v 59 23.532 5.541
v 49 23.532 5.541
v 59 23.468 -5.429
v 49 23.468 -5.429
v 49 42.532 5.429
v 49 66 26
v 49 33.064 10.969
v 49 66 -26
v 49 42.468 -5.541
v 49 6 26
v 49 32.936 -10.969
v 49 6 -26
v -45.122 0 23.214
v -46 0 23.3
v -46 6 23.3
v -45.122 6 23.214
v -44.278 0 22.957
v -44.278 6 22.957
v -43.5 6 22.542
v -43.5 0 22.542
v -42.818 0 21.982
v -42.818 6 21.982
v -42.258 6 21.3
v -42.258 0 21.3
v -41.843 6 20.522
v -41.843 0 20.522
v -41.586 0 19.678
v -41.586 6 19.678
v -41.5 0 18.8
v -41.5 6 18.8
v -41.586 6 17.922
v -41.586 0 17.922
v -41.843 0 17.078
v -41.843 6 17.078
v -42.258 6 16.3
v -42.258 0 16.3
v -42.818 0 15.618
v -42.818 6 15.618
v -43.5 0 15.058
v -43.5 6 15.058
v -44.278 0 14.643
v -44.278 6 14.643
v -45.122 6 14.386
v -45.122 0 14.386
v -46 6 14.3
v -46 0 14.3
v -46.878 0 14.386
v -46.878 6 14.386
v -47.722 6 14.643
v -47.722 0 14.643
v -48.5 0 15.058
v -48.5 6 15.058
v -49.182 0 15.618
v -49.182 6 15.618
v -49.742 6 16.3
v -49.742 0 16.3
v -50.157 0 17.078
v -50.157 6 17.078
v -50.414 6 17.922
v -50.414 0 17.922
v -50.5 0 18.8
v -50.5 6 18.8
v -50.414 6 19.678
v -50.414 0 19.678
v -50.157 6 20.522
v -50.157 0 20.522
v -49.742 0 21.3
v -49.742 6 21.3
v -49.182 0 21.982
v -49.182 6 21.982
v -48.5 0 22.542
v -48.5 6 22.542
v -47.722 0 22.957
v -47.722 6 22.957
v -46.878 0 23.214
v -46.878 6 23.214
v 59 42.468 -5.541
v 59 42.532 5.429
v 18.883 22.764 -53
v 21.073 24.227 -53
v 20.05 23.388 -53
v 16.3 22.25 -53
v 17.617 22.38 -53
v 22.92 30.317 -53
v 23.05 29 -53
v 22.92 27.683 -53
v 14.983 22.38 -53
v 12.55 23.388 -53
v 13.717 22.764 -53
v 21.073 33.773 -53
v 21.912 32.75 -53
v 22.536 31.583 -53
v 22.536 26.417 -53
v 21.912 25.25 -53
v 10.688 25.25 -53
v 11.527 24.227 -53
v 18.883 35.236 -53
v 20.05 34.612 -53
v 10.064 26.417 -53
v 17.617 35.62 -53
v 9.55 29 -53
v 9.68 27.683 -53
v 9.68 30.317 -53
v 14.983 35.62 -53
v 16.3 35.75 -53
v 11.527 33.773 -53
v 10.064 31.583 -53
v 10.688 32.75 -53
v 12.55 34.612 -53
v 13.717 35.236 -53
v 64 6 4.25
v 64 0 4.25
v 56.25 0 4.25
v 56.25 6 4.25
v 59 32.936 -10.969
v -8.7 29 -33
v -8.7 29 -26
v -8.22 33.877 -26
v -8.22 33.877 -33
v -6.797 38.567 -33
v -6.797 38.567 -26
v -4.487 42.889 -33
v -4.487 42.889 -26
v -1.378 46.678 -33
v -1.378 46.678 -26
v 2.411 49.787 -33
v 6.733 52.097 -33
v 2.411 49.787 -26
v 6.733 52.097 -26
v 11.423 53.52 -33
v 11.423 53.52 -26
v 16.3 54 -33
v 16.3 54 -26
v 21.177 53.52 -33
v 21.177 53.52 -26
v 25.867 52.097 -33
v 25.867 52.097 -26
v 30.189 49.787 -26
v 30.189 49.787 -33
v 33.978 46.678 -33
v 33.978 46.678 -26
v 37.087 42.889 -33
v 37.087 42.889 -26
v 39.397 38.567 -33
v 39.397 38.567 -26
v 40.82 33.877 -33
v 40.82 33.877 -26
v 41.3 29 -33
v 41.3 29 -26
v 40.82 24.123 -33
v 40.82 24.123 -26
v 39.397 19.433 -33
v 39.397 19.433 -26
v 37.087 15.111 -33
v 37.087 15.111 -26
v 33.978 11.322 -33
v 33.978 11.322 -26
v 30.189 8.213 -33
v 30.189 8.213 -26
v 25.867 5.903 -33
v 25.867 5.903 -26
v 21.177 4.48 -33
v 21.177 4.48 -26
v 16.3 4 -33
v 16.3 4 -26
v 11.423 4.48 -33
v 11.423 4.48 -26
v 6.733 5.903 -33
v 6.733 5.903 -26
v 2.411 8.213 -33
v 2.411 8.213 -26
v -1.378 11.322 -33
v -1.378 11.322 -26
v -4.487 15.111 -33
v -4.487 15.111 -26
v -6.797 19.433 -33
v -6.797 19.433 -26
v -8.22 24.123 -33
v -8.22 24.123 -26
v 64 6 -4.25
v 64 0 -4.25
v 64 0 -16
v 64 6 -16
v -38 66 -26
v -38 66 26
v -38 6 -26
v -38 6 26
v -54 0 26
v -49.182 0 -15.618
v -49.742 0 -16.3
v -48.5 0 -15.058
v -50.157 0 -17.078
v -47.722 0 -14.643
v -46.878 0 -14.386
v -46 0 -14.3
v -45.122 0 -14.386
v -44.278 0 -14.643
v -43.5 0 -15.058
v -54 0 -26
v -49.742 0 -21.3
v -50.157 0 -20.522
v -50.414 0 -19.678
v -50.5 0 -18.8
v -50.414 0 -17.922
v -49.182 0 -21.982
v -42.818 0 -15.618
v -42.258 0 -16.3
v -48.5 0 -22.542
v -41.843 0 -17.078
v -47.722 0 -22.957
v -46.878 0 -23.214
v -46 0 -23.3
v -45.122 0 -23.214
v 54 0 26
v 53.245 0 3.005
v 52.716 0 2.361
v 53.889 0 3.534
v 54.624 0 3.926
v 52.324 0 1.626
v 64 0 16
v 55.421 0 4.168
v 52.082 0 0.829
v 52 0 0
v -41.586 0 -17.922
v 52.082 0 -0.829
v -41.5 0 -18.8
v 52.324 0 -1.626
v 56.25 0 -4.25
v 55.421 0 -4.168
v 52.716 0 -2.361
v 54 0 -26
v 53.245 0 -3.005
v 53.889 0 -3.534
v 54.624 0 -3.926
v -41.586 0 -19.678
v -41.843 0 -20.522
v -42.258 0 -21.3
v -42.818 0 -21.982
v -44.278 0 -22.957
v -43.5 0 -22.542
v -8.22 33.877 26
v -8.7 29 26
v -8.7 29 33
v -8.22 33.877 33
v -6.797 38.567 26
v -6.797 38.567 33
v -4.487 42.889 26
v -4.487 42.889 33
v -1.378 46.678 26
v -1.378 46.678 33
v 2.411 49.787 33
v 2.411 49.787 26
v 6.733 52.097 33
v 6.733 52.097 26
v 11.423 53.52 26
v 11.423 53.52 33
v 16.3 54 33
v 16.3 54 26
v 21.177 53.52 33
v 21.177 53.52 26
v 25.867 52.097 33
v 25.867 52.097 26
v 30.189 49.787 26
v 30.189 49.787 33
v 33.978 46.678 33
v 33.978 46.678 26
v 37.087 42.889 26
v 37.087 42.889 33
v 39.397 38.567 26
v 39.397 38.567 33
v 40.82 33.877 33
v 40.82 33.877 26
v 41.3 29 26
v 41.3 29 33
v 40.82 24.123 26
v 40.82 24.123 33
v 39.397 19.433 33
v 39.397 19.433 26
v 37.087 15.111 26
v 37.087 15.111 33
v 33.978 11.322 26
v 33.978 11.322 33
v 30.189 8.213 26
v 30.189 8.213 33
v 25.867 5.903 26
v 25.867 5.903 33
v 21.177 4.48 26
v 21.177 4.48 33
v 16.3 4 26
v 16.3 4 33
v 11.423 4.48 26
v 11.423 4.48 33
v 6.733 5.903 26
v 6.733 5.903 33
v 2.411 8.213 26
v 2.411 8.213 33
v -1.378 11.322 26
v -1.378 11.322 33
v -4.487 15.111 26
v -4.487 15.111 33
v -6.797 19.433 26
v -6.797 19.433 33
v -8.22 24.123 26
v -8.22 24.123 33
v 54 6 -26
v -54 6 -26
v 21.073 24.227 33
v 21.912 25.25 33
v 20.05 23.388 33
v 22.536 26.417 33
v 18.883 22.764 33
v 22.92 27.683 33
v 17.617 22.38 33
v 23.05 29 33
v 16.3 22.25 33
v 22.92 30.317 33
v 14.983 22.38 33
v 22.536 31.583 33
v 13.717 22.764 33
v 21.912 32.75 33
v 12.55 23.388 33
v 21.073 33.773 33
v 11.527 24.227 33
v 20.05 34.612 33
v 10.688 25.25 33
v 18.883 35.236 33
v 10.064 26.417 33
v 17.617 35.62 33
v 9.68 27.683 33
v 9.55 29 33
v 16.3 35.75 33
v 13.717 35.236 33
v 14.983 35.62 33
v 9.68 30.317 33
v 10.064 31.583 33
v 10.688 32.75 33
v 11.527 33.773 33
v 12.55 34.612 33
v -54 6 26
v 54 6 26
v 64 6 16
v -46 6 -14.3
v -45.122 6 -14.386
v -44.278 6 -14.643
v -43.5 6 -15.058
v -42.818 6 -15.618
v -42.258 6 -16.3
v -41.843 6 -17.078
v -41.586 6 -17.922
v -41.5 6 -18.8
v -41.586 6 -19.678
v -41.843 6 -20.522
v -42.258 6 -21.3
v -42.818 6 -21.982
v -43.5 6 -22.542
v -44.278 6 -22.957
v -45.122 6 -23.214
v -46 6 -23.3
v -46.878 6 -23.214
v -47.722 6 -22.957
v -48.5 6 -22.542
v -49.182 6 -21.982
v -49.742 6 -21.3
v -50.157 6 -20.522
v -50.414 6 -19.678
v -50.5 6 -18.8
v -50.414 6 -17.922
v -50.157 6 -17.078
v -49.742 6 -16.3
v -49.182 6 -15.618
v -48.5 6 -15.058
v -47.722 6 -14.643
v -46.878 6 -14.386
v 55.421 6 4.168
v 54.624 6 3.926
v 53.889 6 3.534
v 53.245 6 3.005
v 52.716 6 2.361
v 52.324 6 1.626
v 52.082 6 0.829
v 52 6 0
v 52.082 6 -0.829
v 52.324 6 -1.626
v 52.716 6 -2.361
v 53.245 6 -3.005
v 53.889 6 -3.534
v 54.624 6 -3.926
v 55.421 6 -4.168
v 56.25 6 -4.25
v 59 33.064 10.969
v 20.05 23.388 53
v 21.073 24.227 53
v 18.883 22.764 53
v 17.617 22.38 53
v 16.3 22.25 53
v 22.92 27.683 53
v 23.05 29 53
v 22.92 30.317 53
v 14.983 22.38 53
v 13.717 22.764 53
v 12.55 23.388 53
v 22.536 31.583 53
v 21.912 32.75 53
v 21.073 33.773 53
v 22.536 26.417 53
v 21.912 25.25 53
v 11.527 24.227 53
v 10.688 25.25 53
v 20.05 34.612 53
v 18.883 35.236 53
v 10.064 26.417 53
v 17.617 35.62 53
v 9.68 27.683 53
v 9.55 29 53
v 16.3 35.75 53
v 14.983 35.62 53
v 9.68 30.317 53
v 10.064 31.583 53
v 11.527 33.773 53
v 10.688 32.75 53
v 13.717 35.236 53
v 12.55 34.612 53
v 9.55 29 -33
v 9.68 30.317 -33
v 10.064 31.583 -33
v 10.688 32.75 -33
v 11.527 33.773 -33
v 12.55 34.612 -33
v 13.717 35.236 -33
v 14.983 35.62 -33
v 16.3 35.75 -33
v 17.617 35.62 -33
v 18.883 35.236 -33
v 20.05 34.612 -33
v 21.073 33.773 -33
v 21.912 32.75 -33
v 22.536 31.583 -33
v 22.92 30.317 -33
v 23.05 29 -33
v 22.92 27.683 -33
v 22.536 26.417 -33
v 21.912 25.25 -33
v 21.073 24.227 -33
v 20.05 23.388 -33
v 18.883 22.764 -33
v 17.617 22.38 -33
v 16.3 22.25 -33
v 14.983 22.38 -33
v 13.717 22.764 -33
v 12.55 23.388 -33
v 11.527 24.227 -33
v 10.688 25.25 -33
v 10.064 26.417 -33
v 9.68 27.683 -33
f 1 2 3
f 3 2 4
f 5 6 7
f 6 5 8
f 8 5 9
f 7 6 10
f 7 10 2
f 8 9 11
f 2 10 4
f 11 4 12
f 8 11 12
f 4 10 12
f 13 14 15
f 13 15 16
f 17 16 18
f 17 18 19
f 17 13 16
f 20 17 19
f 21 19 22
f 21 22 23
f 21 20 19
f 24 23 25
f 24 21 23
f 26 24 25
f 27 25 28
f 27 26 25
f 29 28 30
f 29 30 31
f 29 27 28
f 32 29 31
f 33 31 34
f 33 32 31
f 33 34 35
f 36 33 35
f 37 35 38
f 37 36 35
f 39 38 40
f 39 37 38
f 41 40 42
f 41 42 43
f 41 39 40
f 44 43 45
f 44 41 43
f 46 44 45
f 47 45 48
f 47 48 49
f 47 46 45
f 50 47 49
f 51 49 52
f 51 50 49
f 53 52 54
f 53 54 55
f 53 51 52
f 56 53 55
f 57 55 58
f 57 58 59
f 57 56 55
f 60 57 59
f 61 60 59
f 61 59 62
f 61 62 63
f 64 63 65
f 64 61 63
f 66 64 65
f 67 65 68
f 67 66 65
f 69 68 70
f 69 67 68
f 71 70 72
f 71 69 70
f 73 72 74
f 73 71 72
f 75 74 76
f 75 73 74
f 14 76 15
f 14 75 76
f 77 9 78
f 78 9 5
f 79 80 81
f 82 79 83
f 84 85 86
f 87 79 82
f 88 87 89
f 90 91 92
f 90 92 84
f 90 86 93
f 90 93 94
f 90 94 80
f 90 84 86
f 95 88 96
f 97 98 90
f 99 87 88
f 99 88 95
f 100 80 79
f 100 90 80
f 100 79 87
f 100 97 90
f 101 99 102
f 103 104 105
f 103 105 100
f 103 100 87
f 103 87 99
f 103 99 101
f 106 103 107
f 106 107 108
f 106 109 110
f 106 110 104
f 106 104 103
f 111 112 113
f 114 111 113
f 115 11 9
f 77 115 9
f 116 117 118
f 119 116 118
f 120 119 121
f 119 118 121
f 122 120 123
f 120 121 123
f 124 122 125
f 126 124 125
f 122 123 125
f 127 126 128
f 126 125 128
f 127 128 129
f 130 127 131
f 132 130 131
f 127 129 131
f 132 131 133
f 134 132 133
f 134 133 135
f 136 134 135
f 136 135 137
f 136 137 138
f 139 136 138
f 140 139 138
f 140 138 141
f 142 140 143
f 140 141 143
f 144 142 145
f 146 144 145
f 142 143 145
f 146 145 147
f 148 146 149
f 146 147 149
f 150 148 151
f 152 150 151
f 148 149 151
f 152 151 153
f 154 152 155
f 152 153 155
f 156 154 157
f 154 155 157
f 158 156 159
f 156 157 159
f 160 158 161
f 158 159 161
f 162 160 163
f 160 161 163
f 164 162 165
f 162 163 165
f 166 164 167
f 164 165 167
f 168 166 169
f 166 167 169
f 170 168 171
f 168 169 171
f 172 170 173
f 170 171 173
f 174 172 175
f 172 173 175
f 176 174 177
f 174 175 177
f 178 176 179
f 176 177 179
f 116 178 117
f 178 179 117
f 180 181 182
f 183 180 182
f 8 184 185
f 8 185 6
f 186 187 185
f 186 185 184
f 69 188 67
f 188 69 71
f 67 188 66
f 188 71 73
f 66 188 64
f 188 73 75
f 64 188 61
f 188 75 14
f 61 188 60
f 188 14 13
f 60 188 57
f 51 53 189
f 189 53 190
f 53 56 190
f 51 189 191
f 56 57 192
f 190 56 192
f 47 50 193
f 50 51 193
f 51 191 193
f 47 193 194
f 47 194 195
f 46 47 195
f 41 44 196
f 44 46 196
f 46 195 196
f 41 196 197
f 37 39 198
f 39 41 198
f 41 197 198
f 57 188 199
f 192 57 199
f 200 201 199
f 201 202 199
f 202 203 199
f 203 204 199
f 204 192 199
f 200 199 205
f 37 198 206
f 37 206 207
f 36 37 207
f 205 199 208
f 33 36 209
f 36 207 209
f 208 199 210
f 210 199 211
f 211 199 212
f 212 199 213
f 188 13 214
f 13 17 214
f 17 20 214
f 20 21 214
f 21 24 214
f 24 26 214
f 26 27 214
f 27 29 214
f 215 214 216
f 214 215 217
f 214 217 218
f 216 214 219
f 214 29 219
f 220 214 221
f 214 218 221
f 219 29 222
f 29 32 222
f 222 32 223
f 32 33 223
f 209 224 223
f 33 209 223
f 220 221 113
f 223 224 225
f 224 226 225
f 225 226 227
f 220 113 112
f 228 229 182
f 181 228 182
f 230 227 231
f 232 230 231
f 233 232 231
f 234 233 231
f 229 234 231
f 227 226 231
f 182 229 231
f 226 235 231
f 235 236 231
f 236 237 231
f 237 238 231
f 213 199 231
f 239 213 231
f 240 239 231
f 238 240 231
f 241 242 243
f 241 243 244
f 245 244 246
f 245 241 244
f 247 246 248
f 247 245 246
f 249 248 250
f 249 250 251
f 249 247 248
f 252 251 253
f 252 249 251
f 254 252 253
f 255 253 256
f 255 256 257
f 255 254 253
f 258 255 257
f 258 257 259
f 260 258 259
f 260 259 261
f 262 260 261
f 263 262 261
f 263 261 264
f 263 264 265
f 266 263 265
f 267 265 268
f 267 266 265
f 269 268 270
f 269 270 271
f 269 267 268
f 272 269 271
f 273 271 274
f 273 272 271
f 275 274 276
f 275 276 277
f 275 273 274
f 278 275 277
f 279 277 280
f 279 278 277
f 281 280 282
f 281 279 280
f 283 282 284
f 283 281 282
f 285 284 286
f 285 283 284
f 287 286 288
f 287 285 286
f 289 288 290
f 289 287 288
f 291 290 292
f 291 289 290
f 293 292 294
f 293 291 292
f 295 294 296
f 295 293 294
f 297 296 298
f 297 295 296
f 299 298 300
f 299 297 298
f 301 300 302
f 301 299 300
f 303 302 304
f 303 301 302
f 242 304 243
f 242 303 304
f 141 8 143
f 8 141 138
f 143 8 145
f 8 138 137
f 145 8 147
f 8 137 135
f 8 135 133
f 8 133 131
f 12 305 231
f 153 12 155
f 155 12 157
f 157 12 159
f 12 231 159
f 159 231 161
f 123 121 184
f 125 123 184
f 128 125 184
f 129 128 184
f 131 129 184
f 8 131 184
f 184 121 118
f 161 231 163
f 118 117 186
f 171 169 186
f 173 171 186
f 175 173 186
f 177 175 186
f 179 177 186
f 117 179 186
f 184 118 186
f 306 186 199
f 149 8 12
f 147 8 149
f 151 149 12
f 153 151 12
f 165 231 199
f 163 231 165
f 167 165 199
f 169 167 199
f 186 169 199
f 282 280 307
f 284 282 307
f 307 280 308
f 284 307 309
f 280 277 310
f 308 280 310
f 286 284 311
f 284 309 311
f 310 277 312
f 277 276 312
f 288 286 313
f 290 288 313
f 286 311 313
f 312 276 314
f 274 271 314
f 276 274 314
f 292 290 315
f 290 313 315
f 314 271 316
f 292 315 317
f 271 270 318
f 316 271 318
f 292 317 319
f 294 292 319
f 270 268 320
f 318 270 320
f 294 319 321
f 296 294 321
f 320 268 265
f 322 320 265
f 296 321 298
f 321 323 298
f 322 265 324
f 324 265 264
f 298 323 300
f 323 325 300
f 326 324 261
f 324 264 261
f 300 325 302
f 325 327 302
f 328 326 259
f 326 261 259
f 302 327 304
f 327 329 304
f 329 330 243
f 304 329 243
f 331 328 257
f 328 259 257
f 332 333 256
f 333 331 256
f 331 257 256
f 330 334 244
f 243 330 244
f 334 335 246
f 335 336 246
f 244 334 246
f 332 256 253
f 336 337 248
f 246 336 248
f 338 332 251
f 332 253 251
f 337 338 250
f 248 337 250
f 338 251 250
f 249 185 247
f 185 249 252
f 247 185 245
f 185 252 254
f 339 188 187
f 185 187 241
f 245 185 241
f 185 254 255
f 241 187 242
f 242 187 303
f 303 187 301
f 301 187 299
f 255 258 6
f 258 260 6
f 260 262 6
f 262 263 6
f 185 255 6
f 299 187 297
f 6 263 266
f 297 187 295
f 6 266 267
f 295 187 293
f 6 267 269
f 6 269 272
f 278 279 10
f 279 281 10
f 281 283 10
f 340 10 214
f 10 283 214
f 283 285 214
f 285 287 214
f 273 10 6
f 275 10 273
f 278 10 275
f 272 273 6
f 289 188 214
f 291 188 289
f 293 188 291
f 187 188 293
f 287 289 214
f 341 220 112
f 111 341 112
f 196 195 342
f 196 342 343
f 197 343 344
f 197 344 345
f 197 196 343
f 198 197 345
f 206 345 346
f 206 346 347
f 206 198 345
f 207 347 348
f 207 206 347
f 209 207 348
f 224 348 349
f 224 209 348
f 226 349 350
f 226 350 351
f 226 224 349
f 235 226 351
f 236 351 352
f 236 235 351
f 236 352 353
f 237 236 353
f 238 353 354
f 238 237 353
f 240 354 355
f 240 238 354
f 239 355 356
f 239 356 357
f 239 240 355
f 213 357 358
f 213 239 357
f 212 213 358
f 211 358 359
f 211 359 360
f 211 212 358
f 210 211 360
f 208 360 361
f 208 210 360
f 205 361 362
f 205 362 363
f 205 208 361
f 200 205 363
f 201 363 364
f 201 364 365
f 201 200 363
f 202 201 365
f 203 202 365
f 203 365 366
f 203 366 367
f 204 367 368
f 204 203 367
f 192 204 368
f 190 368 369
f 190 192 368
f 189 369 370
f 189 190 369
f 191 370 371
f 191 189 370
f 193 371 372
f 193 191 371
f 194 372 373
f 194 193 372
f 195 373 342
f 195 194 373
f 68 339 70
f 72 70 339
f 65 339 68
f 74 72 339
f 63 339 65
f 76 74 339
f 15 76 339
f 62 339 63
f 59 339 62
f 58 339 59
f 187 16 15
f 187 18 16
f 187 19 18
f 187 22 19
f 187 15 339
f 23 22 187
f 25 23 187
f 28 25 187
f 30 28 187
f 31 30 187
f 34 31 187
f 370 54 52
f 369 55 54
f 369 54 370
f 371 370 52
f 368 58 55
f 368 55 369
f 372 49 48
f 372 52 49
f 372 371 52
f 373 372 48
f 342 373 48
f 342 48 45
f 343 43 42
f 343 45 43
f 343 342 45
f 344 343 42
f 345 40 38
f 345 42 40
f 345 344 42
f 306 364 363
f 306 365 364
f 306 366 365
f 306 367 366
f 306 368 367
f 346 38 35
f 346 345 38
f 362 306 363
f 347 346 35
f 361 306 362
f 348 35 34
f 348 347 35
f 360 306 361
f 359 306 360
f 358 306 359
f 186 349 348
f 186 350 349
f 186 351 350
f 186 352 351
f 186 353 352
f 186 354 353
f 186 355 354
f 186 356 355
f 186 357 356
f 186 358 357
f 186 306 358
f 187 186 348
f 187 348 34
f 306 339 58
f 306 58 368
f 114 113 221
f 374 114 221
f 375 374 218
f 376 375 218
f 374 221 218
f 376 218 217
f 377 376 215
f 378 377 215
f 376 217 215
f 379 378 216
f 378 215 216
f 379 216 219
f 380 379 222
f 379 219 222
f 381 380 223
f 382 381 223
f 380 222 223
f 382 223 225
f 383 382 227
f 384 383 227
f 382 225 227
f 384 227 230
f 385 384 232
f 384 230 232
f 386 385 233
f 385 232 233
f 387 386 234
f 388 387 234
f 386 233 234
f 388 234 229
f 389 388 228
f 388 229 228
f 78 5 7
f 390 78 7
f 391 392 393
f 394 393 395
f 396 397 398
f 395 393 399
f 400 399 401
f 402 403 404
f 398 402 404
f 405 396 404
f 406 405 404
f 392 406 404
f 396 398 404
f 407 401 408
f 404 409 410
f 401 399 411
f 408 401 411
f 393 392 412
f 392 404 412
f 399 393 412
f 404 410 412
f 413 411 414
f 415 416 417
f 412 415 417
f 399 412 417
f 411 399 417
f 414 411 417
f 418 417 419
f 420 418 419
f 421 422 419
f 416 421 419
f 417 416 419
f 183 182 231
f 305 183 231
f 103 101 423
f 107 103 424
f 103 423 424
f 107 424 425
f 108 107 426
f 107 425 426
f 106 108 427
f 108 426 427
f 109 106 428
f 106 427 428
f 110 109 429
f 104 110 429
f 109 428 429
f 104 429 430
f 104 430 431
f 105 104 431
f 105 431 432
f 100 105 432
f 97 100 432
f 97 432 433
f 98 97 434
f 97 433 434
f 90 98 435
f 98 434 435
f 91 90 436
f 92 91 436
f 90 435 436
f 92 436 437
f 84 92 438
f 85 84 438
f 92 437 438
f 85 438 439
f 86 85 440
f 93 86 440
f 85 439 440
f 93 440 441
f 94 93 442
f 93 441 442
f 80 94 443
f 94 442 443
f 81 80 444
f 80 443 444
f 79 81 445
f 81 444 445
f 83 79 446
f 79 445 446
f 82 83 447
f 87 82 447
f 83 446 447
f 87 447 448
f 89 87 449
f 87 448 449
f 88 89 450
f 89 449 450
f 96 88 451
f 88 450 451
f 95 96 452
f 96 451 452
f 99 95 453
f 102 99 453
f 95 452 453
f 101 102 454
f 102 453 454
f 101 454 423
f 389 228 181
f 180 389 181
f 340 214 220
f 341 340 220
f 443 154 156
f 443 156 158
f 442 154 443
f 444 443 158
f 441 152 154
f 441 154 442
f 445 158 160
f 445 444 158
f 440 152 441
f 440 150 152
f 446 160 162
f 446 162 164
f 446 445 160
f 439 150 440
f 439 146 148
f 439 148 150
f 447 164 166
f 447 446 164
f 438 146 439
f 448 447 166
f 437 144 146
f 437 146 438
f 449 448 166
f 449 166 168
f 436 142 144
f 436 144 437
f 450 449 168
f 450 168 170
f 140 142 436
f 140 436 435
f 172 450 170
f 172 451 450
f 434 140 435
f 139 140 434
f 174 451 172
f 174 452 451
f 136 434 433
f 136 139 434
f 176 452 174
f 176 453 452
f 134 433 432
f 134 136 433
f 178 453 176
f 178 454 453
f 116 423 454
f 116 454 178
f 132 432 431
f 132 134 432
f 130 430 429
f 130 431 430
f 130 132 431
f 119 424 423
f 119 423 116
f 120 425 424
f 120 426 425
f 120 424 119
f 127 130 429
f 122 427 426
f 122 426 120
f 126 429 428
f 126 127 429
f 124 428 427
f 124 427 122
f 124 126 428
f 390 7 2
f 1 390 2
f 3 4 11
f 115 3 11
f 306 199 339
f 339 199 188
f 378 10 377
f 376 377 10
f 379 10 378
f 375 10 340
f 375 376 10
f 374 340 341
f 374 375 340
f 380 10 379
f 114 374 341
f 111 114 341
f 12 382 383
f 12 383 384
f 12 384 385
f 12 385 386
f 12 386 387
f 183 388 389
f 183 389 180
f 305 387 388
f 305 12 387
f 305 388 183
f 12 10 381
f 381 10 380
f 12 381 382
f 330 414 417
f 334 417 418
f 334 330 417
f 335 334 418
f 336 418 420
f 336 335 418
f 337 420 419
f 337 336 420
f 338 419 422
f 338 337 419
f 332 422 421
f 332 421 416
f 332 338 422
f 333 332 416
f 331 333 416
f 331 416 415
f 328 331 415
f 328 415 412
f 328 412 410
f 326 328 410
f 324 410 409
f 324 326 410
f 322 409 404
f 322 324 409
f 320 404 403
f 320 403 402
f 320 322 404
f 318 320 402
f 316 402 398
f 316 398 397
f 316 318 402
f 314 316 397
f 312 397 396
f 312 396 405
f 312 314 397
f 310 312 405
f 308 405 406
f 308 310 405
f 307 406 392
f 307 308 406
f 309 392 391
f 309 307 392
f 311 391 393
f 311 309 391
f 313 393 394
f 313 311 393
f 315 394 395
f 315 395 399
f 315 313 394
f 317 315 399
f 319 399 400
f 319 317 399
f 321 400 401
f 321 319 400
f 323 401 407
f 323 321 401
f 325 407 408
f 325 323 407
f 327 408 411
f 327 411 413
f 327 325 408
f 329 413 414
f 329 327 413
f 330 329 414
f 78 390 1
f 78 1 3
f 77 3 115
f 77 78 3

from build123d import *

# Parameters (mm, degrees)
SZKIC1_R                    = 4.5
DODANIE_WYCI_GNI_CIE1_DEPTH = 6
SZKIC2_W                    = 87
SZKIC2_H                    = 52
DODANIE_WYCI_GNI_CIE2_DEPTH = 60
SZKIC3_R                    = 25
DODANIE_WYCI_GNI_CIE3_DEPTH = 7
SZKIC4_R                    = 6.75
DODANIE_WYCI_GNI_CIE4_DEPTH = 20
DODANIE_WYCI_GNI_CIE5_DEPTH = 10


with BuildPart() as part:
    # Szkic1 → Dodanie-wyciągnięcie1 (new body)
    with BuildSketch(Plane(origin=(0, 0, 0), x_dir=(1, 0, 0), z_dir=(0, 1, 0))):
        with BuildLine():
            Line((64, 16), (54, 26))
            Line((54, 26), (-54, 26))
            Line((-54, 26), (-54, -26))
            Line((-54, -26), (54, -26))
            Line((54, -26), (64, -16))
            Line((64, -16), (64, -4.25))
            Line((64, -4.25), (56.25, -4.25))
            ThreePointArc((56.25, -4.25), (52, 0), (56.25, 4.25))
            Line((56.25, 4.25), (64, 4.25))
            Line((64, 4.25), (64, 16))
        make_face()
        with Locations(Location((-46, -18.8, 0), (0, 0, 270))):
            Circle(SZKIC1_R, mode=Mode.SUBTRACT)
        with Locations(Location((-46, 18.8, 0), (0, 0, 270))):
            Circle(SZKIC1_R, mode=Mode.SUBTRACT)
    extrude(amount=DODANIE_WYCI_GNI_CIE1_DEPTH)

    # Szkic2 → Dodanie-wyciągnięcie2 (add)
    with BuildSketch(Plane(origin=(0, 6, 0), x_dir=(1, 0, 0), z_dir=(0, 1, 0))):
        with Locations((5.5, 0)):
            Rectangle(SZKIC2_W, SZKIC2_H)
    extrude(amount=DODANIE_WYCI_GNI_CIE2_DEPTH)

    # Szkic3 → Dodanie-wyciągnięcie3 (add)
    with BuildSketch(Plane(origin=(0, 0, -26), x_dir=(-1, 0, 0), z_dir=(0, 0, -1))):
        with Locations((-16.3, 29)):
            Circle(SZKIC3_R)
    dodanie_wyci_gni_cie3 = extrude(amount=DODANIE_WYCI_GNI_CIE3_DEPTH)

    # Szkic4 → Dodanie-wyciągnięcie4 (add)
    with BuildSketch(Plane(origin=(0, 0, -33), x_dir=(-1, 0, 0), z_dir=(0, 0, -1))):
        with Locations((-16.3, 29)):
            Circle(SZKIC4_R)
    dodanie_wyci_gni_cie4 = extrude(amount=DODANIE_WYCI_GNI_CIE4_DEPTH)

    # Lustro1: Dodanie-wyciągnięcie3, Dodanie-wyciągnięcie4 across plane
    add(dodanie_wyci_gni_cie3.mirror(Plane.XY))
    add(dodanie_wyci_gni_cie4.mirror(Plane.XY))

    # Szkic5 → Dodanie-wyciągnięcie5 (add)
    with BuildSketch(Plane(origin=(49, 0, 0), x_dir=(0, 0, -1), z_dir=(1, 0, 0))):
        Polygon((5.428883431, 23.467919533), (10.969465551, 32.935510732), (5.54058212, 42.467591199), (-5.428883431, 42.532080467), (-10.969465551, 33.064489268), (-5.54058212, 23.532408801), align=None)
    extrude(amount=DODANIE_WYCI_GNI_CIE5_DEPTH)


solid = part.part
